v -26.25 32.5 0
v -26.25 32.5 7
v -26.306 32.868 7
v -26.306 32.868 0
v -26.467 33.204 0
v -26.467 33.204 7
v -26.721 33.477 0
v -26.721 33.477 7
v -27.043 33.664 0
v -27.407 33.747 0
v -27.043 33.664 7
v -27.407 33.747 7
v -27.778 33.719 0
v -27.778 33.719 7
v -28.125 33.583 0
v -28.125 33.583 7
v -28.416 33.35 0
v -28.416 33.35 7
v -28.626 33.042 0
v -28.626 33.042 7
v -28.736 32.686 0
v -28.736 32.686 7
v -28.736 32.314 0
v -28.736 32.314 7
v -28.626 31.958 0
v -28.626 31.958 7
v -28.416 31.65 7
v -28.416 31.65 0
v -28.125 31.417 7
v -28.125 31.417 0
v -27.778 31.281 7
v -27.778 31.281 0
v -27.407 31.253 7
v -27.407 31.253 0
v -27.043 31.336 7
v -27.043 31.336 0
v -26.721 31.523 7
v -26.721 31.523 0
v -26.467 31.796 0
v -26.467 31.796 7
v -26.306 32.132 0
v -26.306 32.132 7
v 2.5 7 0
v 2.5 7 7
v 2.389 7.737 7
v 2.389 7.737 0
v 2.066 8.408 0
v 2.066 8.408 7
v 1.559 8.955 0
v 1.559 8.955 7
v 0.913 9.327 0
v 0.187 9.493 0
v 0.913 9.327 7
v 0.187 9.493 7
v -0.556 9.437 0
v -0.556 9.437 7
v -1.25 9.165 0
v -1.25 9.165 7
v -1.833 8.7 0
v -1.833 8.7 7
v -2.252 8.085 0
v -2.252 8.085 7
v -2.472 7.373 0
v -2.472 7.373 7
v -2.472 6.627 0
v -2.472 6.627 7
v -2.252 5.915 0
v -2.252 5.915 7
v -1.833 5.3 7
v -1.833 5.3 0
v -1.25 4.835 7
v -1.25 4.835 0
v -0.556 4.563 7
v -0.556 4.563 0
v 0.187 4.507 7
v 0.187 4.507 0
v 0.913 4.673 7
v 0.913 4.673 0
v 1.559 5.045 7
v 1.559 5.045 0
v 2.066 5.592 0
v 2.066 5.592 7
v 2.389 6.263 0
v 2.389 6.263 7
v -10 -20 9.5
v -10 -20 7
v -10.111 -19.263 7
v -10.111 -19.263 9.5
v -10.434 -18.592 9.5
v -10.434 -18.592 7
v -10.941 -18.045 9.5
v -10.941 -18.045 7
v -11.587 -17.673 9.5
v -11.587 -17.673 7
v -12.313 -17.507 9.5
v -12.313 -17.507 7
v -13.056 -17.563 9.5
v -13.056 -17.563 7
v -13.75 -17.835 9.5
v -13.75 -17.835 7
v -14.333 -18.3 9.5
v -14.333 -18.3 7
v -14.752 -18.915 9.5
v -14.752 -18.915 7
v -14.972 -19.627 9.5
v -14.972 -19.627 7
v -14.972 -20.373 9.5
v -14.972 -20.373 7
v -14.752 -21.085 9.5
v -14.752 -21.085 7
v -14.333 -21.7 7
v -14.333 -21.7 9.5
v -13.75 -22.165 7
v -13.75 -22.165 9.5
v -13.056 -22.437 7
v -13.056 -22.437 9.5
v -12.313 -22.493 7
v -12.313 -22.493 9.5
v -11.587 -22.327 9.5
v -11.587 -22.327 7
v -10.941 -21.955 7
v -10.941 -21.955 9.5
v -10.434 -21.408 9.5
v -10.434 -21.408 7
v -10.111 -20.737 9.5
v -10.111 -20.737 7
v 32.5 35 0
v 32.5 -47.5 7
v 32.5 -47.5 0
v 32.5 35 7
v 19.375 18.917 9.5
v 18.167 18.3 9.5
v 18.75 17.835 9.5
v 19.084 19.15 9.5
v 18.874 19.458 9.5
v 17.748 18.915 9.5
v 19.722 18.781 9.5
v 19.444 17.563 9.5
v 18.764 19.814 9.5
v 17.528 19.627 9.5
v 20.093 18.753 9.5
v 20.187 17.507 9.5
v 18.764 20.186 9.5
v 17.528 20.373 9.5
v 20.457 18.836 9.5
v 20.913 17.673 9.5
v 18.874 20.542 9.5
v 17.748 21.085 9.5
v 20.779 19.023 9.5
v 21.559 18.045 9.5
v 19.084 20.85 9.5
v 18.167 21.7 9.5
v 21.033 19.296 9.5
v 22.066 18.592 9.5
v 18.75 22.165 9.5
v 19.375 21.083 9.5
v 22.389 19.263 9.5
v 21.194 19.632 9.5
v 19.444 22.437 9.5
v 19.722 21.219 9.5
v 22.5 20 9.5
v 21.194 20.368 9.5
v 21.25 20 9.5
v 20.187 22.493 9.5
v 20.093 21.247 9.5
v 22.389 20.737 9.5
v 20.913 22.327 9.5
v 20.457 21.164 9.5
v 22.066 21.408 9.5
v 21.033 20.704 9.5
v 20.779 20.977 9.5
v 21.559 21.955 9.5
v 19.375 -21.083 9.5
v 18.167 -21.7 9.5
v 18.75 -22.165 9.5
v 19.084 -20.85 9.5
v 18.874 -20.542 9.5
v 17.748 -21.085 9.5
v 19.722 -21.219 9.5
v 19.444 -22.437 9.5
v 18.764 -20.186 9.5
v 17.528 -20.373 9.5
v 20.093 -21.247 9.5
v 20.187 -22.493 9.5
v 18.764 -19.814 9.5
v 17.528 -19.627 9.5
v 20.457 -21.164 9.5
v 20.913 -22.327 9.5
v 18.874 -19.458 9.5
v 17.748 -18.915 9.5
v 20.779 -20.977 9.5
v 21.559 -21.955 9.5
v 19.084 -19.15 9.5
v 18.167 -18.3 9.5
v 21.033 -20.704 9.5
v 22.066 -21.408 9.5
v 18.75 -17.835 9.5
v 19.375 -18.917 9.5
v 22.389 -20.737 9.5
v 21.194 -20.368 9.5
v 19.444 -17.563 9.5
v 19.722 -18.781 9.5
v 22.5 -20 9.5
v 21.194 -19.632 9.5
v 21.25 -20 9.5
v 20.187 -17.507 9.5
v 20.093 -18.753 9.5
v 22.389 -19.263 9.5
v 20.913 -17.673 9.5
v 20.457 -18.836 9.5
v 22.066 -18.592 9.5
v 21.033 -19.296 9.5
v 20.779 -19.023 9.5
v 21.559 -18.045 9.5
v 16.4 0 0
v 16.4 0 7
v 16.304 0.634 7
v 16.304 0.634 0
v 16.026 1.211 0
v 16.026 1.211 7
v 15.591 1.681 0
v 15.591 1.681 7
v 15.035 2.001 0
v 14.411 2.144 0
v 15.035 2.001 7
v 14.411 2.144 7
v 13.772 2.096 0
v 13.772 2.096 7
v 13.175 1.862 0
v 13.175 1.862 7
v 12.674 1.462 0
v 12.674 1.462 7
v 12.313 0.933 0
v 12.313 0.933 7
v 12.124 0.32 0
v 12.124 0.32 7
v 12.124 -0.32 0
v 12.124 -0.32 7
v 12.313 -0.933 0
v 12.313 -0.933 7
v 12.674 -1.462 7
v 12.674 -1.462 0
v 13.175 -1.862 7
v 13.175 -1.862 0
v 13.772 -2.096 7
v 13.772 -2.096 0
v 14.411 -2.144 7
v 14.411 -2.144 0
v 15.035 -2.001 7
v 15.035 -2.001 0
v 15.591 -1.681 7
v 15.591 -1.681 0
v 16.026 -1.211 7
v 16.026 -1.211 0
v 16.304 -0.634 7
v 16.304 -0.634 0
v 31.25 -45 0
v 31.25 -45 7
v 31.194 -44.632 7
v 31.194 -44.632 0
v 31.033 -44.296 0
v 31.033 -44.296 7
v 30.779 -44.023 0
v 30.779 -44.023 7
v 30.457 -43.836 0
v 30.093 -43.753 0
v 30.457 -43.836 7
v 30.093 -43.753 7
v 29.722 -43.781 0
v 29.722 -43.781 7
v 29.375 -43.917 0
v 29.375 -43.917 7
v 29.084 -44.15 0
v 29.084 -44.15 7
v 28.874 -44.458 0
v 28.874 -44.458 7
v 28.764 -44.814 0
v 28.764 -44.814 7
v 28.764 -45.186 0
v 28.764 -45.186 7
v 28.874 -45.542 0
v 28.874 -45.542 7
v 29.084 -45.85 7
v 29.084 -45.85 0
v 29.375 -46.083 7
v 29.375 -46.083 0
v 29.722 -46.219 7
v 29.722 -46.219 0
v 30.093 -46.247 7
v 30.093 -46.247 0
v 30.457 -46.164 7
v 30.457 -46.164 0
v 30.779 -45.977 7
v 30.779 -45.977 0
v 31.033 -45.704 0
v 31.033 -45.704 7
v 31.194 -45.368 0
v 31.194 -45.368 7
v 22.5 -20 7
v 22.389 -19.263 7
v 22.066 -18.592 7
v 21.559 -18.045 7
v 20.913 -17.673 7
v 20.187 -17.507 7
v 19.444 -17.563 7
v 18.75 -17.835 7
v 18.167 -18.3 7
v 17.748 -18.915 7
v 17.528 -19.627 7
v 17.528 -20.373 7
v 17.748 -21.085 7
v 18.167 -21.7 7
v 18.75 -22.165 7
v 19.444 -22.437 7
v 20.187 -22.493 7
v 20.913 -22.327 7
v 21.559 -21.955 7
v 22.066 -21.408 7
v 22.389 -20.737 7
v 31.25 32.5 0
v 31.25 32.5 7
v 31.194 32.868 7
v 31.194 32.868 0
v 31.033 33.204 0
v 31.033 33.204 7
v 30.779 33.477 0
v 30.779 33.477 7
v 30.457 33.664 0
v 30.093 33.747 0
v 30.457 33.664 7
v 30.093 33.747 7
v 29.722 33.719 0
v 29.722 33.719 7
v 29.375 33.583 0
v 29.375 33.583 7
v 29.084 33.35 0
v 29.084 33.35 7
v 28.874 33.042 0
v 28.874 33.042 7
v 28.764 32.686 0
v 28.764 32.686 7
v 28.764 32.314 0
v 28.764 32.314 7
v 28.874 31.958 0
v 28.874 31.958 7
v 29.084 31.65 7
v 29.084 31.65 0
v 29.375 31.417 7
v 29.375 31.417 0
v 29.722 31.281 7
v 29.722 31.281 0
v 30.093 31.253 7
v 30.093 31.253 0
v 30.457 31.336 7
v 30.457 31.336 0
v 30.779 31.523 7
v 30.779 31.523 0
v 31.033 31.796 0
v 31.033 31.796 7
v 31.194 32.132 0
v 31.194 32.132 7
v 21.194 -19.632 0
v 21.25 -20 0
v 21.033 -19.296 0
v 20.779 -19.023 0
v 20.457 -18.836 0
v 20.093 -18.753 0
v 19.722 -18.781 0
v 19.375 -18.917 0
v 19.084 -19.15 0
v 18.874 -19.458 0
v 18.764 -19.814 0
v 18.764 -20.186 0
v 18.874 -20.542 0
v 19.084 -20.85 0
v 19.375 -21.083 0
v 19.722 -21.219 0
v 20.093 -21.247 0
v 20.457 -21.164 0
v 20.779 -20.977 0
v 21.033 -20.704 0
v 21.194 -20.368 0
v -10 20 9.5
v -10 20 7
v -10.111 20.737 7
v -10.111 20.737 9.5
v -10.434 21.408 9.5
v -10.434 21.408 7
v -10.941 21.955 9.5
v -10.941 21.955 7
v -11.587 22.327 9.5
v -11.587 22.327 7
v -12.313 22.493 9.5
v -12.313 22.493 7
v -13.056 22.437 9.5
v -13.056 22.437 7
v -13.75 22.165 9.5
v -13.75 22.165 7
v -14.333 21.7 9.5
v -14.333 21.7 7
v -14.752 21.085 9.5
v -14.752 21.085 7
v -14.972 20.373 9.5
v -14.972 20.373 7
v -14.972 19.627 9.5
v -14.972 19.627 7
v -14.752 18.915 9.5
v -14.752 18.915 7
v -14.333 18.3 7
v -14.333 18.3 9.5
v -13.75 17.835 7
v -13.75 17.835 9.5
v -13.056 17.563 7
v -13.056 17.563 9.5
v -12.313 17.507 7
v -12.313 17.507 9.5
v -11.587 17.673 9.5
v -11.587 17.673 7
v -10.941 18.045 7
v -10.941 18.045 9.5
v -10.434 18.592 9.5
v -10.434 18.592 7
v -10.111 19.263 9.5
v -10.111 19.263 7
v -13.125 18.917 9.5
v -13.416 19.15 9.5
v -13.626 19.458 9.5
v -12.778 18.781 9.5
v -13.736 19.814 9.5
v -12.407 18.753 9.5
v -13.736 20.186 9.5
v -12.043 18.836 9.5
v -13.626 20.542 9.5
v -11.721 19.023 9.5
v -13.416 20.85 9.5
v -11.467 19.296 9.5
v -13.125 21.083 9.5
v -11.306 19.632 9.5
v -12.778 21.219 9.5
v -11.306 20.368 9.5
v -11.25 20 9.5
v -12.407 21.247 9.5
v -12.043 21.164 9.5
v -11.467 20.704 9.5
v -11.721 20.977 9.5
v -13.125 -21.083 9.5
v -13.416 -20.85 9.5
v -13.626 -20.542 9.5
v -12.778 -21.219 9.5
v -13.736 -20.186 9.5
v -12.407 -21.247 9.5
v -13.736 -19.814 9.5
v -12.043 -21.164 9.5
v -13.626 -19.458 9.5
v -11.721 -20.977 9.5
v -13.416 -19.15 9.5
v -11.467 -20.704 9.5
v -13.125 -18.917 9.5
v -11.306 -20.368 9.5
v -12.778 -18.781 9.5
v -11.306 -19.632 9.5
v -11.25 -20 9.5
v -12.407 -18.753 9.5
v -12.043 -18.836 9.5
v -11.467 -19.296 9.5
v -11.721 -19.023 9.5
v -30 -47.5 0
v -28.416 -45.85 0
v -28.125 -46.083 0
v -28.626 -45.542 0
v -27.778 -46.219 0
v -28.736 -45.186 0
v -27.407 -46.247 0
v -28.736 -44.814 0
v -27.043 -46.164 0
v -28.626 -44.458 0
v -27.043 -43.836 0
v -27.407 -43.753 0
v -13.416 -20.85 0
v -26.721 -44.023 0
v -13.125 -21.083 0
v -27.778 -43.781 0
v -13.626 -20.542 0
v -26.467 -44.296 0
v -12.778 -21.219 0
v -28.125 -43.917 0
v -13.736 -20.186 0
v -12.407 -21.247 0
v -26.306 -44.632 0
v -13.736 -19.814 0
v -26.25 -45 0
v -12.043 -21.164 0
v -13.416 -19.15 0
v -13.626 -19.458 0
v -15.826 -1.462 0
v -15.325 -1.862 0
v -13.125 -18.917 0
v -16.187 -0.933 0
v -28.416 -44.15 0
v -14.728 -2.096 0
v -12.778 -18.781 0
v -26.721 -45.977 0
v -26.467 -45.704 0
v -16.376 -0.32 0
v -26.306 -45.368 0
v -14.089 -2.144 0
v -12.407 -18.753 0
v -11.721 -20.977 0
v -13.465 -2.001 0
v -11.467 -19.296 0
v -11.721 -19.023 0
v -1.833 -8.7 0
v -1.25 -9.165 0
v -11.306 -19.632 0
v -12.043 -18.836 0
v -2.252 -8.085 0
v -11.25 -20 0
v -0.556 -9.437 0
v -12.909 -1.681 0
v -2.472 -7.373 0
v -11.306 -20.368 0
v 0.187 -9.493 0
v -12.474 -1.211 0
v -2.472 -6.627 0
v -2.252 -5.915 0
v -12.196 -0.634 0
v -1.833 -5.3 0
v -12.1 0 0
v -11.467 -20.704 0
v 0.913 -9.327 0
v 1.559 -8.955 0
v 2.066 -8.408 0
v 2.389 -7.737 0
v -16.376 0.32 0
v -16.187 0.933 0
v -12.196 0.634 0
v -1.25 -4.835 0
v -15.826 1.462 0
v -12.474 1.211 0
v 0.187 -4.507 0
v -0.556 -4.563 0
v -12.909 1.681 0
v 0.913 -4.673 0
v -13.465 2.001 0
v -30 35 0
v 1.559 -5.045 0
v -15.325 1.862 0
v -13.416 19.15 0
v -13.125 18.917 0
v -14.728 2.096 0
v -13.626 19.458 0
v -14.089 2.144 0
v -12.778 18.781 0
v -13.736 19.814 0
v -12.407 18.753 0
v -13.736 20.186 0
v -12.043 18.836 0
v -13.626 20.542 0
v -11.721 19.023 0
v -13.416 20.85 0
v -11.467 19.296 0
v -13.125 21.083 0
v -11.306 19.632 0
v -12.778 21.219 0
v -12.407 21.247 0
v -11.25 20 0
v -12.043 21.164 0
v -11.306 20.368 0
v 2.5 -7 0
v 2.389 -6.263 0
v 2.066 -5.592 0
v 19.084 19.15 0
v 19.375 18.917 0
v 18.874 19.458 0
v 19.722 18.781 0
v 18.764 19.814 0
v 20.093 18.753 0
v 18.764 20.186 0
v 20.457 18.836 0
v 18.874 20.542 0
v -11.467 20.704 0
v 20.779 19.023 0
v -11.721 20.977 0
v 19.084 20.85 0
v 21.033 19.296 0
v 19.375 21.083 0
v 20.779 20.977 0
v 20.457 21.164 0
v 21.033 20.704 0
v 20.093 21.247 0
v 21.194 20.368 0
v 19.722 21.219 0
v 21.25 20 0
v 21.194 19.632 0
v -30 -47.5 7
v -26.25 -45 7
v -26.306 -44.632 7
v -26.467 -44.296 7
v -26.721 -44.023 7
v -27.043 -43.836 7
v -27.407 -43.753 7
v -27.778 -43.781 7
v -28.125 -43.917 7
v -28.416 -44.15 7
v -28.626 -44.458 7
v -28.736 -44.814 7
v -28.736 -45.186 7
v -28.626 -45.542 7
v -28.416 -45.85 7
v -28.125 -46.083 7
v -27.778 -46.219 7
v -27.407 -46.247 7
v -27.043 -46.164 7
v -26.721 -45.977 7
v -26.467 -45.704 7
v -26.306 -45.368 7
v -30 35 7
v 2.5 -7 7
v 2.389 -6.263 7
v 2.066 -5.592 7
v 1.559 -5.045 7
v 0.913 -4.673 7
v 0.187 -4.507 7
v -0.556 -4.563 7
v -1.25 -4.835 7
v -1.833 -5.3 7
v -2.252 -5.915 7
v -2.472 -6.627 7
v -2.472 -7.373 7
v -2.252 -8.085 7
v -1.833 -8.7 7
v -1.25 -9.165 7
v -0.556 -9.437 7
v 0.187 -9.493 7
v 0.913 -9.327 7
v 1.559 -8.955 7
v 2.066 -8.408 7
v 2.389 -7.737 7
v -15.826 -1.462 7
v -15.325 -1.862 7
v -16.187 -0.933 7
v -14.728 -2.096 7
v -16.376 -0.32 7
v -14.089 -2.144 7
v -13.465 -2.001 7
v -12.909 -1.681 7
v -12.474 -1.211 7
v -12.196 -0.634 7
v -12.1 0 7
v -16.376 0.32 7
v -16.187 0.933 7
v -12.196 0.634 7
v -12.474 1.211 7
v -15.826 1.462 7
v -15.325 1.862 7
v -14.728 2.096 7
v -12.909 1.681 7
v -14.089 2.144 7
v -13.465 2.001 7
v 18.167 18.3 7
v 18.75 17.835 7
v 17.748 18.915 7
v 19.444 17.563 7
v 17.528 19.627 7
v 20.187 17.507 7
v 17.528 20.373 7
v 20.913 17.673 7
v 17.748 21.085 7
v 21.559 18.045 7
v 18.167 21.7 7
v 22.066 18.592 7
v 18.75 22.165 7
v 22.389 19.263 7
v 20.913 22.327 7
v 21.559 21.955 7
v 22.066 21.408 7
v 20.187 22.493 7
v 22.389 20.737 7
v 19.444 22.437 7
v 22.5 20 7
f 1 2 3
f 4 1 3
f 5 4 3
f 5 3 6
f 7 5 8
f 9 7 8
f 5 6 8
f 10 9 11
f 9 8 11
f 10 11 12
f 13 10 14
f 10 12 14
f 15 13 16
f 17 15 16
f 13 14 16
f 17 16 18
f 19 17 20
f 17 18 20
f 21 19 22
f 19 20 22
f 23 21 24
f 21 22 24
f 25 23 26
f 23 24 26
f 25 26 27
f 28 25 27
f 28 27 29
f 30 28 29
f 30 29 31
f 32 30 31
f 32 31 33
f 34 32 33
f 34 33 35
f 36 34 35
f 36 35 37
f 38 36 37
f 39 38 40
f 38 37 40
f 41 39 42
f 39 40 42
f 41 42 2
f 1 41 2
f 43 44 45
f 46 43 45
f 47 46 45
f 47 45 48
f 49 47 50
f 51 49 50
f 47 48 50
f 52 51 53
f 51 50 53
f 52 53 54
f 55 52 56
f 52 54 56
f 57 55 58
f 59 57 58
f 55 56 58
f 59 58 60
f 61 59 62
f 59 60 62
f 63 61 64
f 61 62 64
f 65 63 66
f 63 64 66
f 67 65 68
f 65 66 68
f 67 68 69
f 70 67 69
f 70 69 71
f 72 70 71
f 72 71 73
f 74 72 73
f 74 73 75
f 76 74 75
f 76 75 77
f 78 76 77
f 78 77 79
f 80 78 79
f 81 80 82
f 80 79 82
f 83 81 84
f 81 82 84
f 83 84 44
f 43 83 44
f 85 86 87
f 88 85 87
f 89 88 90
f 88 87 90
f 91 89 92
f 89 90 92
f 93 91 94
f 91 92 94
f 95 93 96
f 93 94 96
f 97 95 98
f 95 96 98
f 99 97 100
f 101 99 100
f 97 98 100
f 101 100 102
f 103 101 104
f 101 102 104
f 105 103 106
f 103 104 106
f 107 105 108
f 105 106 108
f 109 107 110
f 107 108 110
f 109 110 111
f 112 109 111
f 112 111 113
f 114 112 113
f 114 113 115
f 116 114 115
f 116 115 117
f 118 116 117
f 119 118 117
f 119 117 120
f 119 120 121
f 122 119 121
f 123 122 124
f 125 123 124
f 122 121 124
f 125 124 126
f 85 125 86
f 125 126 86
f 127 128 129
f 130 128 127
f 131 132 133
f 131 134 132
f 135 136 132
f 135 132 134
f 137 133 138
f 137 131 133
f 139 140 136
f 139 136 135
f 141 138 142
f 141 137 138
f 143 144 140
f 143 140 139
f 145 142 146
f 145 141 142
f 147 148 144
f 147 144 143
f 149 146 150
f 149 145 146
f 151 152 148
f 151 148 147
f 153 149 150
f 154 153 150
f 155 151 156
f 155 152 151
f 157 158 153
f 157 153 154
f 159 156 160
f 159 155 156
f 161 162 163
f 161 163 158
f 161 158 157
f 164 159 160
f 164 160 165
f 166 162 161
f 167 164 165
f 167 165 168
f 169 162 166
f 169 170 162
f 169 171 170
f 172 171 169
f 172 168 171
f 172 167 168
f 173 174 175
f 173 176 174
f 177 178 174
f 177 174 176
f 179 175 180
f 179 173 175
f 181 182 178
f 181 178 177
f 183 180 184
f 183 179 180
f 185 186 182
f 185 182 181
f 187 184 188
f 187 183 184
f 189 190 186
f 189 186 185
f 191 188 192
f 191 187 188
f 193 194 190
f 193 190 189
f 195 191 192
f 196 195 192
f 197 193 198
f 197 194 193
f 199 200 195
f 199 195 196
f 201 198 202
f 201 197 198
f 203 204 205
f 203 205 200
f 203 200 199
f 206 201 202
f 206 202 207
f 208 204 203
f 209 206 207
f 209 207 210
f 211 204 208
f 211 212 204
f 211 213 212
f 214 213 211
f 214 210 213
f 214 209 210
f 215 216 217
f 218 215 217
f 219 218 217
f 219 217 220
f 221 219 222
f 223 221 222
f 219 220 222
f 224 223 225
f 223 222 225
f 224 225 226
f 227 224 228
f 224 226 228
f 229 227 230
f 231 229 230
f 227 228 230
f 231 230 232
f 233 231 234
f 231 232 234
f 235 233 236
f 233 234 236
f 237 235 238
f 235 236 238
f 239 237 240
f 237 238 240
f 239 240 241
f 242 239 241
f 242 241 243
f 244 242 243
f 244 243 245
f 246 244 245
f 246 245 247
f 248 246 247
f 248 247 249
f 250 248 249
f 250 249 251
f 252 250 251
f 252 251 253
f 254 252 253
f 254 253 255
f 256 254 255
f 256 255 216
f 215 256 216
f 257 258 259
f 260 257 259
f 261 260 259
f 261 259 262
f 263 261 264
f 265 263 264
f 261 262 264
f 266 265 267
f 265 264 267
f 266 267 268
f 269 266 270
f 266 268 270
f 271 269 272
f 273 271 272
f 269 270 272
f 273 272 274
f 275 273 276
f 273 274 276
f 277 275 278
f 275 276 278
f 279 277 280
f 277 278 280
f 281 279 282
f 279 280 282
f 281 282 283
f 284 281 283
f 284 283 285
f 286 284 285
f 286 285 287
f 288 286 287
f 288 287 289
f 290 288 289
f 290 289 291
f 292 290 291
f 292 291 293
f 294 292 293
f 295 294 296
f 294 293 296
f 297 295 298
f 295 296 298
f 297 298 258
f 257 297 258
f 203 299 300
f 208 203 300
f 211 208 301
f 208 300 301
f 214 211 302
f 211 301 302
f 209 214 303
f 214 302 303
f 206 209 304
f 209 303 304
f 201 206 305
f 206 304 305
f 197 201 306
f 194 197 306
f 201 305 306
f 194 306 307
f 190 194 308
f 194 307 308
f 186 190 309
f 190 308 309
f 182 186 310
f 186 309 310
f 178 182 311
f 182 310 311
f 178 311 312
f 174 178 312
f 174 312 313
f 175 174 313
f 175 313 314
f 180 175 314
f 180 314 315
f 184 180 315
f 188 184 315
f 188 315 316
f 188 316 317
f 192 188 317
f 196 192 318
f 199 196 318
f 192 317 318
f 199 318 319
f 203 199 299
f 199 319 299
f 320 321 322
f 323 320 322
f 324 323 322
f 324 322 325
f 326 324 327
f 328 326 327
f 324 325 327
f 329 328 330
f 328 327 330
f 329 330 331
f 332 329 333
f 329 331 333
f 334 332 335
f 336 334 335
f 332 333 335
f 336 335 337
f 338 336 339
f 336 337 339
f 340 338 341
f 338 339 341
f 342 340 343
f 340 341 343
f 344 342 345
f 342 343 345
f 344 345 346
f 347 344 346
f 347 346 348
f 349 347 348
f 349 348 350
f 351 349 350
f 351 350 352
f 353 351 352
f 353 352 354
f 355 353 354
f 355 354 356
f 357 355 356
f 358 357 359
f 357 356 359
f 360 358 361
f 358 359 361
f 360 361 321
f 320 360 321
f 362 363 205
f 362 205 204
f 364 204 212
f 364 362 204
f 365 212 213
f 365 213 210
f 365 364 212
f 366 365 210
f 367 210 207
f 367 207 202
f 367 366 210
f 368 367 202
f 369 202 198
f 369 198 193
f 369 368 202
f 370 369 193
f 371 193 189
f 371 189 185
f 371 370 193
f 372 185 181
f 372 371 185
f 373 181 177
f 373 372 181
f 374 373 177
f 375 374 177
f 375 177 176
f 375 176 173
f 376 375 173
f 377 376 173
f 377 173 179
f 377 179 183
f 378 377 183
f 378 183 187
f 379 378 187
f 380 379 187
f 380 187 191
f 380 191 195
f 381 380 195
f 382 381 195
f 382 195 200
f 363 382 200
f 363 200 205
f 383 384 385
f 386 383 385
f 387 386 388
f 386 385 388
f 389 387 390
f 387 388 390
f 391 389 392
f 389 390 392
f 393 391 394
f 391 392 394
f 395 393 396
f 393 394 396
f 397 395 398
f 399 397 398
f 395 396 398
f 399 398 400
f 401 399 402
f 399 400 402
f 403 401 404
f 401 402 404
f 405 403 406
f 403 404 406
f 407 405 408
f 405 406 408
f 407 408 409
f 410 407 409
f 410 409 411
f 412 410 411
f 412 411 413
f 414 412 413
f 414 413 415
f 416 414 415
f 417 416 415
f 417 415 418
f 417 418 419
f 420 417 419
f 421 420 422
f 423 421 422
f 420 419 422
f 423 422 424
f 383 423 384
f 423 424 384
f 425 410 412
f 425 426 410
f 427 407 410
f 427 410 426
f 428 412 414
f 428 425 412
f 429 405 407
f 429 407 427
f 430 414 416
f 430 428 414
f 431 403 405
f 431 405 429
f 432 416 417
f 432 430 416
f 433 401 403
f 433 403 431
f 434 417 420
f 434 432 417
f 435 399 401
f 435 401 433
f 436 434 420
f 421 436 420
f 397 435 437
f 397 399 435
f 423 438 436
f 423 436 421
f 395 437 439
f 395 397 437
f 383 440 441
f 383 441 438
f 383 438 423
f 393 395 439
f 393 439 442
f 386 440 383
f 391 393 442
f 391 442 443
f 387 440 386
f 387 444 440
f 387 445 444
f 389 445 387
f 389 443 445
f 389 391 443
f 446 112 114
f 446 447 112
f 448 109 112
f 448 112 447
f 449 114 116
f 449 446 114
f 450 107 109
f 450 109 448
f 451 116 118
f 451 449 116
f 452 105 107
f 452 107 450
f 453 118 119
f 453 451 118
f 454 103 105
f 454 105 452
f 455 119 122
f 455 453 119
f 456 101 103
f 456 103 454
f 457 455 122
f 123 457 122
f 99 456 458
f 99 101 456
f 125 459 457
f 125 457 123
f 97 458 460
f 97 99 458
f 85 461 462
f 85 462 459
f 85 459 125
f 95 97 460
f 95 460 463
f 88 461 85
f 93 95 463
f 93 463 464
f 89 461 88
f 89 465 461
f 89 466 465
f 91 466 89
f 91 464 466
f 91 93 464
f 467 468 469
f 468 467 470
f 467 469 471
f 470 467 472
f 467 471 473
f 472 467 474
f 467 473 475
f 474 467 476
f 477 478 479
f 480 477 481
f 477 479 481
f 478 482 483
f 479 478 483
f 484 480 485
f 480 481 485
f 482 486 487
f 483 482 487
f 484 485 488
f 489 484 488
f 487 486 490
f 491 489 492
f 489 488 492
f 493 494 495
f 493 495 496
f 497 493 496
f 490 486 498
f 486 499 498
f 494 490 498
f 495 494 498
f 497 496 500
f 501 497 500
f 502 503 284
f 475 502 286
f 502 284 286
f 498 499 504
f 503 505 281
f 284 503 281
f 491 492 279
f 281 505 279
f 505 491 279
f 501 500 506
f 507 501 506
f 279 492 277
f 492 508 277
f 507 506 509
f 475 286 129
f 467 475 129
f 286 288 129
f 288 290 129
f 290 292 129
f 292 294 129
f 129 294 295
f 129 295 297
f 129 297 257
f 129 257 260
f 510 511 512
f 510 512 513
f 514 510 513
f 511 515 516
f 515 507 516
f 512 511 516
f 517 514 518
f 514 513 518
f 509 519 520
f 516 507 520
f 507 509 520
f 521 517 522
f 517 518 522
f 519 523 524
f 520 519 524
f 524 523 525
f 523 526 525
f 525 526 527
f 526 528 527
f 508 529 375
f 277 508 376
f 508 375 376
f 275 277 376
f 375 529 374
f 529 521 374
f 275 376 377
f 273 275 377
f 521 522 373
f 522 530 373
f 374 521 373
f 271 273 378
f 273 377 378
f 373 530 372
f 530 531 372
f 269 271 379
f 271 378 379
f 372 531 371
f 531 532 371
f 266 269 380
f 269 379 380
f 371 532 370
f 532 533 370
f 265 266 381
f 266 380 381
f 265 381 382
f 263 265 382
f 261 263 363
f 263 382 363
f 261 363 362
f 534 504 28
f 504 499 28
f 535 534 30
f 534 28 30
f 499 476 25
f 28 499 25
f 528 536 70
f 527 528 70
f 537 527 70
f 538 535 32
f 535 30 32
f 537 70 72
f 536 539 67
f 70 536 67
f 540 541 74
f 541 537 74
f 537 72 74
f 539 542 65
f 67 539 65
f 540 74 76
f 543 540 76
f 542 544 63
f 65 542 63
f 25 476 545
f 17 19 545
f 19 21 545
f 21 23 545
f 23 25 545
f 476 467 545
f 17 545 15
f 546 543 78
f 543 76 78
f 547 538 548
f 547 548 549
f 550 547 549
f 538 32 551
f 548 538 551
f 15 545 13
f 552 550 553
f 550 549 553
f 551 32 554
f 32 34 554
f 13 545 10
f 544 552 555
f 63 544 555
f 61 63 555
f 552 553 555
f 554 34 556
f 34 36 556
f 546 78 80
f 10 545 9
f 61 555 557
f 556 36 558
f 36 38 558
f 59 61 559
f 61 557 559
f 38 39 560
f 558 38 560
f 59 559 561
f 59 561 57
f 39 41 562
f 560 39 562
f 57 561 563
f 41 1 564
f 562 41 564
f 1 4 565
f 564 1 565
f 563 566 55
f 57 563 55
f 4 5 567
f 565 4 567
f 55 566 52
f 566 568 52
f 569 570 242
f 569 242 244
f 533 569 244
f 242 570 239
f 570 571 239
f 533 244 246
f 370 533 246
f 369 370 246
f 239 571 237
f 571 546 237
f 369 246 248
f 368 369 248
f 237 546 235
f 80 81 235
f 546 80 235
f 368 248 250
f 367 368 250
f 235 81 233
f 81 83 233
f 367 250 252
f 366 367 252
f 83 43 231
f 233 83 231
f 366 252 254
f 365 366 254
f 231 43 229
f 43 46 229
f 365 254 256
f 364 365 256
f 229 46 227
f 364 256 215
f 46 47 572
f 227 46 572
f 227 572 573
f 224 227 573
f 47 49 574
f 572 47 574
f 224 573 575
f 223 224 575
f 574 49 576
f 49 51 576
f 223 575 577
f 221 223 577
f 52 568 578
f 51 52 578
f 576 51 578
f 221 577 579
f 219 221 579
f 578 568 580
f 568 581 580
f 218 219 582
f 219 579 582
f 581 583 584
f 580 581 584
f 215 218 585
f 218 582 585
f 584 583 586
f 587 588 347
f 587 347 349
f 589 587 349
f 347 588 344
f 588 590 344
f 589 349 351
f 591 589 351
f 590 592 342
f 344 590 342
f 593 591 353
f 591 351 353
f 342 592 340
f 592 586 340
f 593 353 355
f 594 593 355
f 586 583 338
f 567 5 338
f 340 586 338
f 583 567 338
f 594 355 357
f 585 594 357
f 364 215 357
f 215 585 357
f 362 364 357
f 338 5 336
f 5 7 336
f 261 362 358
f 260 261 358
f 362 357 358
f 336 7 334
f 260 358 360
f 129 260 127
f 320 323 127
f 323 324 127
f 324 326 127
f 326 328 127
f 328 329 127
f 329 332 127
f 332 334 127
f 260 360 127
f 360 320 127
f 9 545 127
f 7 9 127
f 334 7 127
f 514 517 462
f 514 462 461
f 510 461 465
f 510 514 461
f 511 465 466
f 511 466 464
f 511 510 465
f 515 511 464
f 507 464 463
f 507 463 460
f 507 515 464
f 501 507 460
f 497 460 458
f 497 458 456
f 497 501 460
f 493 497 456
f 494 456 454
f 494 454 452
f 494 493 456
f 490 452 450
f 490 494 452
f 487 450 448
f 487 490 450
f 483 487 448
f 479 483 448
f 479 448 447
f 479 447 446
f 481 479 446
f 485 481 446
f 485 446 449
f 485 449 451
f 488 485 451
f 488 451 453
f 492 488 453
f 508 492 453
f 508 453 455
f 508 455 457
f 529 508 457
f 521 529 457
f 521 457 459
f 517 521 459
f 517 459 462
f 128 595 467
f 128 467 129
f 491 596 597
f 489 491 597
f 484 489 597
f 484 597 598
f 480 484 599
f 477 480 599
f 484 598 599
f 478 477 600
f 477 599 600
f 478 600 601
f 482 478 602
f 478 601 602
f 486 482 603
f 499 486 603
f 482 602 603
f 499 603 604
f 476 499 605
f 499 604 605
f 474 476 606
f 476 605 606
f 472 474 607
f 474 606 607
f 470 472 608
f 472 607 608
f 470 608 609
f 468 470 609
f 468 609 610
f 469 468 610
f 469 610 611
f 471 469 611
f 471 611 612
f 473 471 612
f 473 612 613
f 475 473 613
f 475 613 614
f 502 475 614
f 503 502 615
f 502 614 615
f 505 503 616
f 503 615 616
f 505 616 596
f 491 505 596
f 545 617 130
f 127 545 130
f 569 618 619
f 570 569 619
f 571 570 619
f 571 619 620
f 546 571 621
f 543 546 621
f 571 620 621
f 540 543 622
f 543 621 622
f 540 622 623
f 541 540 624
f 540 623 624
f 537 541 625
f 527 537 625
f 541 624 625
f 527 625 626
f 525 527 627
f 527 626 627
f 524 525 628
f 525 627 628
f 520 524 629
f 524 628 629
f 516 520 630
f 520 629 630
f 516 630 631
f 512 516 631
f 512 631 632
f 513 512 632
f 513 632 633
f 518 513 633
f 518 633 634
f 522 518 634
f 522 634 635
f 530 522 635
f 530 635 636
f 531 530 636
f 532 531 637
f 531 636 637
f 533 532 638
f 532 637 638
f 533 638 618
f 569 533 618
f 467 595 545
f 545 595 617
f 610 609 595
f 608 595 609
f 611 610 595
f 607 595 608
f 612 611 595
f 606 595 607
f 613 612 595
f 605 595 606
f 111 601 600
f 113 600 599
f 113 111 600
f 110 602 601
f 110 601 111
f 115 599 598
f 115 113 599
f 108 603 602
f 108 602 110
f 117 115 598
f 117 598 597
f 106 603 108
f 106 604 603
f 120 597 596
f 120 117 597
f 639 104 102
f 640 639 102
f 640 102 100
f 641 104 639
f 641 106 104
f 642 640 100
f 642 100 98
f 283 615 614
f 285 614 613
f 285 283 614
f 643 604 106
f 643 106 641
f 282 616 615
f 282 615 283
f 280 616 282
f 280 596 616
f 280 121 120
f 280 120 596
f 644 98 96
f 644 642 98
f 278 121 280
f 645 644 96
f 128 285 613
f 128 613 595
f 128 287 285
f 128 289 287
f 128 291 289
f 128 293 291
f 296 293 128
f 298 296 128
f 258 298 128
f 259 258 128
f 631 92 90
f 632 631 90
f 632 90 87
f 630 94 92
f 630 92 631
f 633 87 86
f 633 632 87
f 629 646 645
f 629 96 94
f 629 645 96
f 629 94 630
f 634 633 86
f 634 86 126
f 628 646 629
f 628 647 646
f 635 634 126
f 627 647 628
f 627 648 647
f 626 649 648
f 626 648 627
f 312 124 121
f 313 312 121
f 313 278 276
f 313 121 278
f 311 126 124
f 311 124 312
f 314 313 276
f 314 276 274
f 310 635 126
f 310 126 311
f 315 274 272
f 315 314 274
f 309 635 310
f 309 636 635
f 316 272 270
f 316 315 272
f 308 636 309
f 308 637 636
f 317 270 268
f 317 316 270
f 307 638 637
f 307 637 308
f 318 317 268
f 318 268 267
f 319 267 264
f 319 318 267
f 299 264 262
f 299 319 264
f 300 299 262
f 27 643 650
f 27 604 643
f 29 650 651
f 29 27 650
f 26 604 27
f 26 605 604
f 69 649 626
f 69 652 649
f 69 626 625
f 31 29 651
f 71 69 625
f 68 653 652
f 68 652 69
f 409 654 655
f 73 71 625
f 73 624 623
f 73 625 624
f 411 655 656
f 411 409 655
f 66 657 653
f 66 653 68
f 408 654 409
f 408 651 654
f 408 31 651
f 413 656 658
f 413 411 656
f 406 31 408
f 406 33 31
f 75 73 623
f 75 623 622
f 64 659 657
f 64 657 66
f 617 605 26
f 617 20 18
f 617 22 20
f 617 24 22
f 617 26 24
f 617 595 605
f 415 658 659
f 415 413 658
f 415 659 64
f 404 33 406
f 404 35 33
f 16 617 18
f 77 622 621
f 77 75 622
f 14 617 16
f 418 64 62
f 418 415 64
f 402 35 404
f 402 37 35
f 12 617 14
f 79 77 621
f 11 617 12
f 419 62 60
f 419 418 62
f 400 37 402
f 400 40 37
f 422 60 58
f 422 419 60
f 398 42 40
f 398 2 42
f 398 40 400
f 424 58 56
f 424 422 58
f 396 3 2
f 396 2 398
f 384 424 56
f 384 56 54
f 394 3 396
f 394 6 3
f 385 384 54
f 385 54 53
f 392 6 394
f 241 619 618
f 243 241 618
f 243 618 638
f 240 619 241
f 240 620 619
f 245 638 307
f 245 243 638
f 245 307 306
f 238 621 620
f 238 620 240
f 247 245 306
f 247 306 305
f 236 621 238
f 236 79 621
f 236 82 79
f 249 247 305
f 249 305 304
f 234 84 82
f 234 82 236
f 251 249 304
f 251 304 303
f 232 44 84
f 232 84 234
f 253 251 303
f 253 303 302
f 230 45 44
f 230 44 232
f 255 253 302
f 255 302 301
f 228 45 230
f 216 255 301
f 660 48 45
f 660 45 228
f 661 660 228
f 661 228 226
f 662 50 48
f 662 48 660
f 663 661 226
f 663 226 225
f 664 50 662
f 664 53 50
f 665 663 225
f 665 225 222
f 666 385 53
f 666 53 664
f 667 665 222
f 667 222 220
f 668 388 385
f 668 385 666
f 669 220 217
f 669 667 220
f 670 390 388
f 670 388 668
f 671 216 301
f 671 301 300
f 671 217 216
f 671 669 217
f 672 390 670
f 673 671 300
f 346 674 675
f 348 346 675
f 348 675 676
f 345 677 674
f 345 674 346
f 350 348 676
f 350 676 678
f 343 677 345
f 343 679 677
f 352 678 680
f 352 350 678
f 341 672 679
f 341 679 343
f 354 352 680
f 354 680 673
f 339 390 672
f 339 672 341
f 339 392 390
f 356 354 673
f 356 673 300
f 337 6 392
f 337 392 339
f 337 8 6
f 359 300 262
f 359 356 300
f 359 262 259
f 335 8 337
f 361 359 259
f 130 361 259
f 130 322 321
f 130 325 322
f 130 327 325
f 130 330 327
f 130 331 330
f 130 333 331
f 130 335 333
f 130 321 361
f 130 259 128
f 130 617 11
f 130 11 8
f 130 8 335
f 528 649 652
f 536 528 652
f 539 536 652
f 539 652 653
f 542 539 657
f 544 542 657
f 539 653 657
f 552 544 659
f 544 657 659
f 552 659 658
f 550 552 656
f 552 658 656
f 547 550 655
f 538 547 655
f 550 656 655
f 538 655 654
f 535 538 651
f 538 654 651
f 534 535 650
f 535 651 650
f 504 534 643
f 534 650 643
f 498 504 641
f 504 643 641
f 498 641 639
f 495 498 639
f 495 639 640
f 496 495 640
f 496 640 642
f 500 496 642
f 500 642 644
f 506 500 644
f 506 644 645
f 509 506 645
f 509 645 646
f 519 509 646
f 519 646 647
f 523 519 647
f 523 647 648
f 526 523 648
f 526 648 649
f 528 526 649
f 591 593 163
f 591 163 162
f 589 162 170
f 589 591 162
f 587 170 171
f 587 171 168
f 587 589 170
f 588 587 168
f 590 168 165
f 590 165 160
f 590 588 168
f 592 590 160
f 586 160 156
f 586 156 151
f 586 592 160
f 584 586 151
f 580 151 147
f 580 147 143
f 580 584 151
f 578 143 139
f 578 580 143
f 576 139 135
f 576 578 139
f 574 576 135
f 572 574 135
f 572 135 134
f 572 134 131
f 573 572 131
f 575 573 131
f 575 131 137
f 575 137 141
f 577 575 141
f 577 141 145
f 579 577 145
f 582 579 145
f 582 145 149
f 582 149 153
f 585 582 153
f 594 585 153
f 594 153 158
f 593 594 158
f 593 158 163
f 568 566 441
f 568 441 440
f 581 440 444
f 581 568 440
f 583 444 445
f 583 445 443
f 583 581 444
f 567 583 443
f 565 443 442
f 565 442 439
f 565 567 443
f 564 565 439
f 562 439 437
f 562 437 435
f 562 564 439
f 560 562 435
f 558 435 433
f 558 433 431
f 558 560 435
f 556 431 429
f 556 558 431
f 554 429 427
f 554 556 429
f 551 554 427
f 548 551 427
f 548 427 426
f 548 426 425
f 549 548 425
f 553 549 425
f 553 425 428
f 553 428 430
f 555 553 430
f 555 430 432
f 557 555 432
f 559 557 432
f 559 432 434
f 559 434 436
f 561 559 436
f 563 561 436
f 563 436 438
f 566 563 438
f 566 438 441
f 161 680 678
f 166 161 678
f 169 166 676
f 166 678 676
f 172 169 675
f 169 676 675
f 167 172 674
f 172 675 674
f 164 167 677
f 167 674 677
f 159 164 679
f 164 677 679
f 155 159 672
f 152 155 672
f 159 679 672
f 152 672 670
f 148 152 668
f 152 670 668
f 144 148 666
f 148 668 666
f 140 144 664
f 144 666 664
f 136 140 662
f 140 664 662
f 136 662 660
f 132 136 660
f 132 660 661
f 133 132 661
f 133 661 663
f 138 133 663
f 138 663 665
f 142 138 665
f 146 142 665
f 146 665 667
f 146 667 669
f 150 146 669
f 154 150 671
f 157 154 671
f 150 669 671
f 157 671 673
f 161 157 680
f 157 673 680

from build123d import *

# Parameters (mm, degrees)
SKIZZE1_R                         = 2.15
AUFSATZ_LINEAR_AUSTRAGEN1_DEPTH   = 12
AUFSATZ_LINEAR_AUSTRAGEN1_2_DEPTH = 12
AUFSATZ_LINEAR_START              = 7
SKIZZE1_3_W                       = 10
SKIZZE1_3_H                       = 34
SKIZZE1_3_R                       = 2.15
SKIZZE1_3_R_2                     = 2.5
AUFSATZ_LINEAR_AUSTRAGEN3_DEPTH   = 7
SKIZZE4_W                         = 52.5
SKIZZE4_H                         = 72.5
SKIZZE4_R                         = 2.5
SKIZZE4_R_2                       = 2.15
AUFSATZ_LINEAR_AUSTRAGEN4_DEPTH   = 7
SKIZZE4_3_R                       = 2.5
SKIZZE4_3_R_2                     = 1.25
AUFSATZ_LINEAR_AUSTRAGEN5_DEPTH   = 2.5
SCHNITT_LINEAR_START              = -7
SKIZZE4_4_R                       = 1.25
SCHNITT_LINEAR_AUSTRAGEN1_DEPTH   = 7
SKIZZE4_5_R                       = 2.15
SCHNITT_LINEAR_AUSTRAGEN2_DEPTH   = 19
SKIZZE6_W                         = 62.5
SKIZZE6_H                         = 82.5
SKIZZE6_W_2                       = 52.5
SKIZZE6_H_2                       = 72.5
AUFSATZ_LINEAR_AUSTRAGEN6_DEPTH   = 7
SKIZZE5_R                         = 1.25
SCHNITT_LINEAR_AUSTRAGEN3_DEPTH   = 7


with BuildPart() as part:
    # Skizze1 → Aufsatz-Linear austragen1 (new body)
    with BuildSketch(Plane.XY):
        with Locations((-14.25, 0)):
            Circle(SKIZZE1_R)
    extrude(amount=-AUFSATZ_LINEAR_AUSTRAGEN1_DEPTH)



with BuildPart() as body_2:
    # Skizze1 → Aufsatz-Linear austragen1 2 (new body)
    with BuildSketch(Plane.XY):
        with Locations((14.25, 0)):
            Circle(SKIZZE1_R)
    extrude(amount=-AUFSATZ_LINEAR_AUSTRAGEN1_2_DEPTH)


with BuildPart() as part_1:
    add(part.part)

    add(body_2.part)  # Aufsatz-Linear austragen3 merges body 2
    # Skizze1<3> → Aufsatz-Linear austragen3 (add)
    # profile 1 of 4: a face of its own
    with BuildSketch(Plane.XY.offset(AUFSATZ_LINEAR_START)):
        with Locations((-12.5, 0)):
            Rectangle(SKIZZE1_3_W, SKIZZE1_3_H)
        with Locations((-14.25, 0)):
            Circle(SKIZZE1_3_R, mode=Mode.SUBTRACT)
    # profile 2 of 4: a face of its own
    with BuildSketch(Plane.XY.offset(AUFSATZ_LINEAR_START)):
        Polygon((17.5, -17), (17.5, 17), (0, 17), (-7.5, 17), (-7.5, -17), align=None)
        with Locations((0, -7)):
            Circle(SKIZZE1_3_R_2, mode=Mode.SUBTRACT)
        with Locations((0, 7)):
            Circle(SKIZZE1_3_R_2, mode=Mode.SUBTRACT)
        with Locations((14.25, 0)):
            Circle(SKIZZE1_3_R, mode=Mode.SUBTRACT)
    # profile 3 of 4: a face of its own
    with BuildSketch(Plane.XY.offset(AUFSATZ_LINEAR_START)):
        with Locations((-14.25, 0)):
            Circle(SKIZZE1_3_R)
    # profile 4 of 4: a face of its own
    with BuildSketch(Plane.XY.offset(AUFSATZ_LINEAR_START)):
        with Locations((14.25, 0)):
            Circle(SKIZZE1_3_R)
    extrude(amount=-AUFSATZ_LINEAR_AUSTRAGEN3_DEPTH)

    # Skizze4 → Aufsatz-Linear austragen4 (add)
    with BuildSketch(Plane.XY.offset(7)):
        with Locations((1.25, -6.25)):
            Rectangle(SKIZZE4_W, SKIZZE4_H)
        with Locations((0, -7)):
            Circle(SKIZZE4_R, mode=Mode.SUBTRACT)
        with Locations((-14.25, 0)):
            Circle(SKIZZE4_R_2, mode=Mode.SUBTRACT)
        with Locations((0, 7)):
            Circle(SKIZZE4_R, mode=Mode.SUBTRACT)
        with Locations((14.25, 0)):
            Circle(SKIZZE4_R_2, mode=Mode.SUBTRACT)
    extrude(amount=-AUFSATZ_LINEAR_AUSTRAGEN4_DEPTH)

    # Skizze4<3> → Aufsatz-Linear austragen5 (add)
    # profile 1 of 4: a face of its own
    with BuildSketch(Plane.XY.offset(7)):
        with Locations((-12.5, -20)):
            Circle(SKIZZE4_3_R)
        with Locations((-12.5, -20)):
            Circle(SKIZZE4_3_R_2, mode=Mode.SUBTRACT)
    # profile 2 of 4: a face of its own
    with BuildSketch(Plane.XY.offset(7)):
        with Locations((-12.5, 20)):
            Circle(SKIZZE4_3_R)
        with Locations((-12.5, 20)):
            Circle(SKIZZE4_3_R_2, mode=Mode.SUBTRACT)
    # profile 3 of 4: a face of its own
    with BuildSketch(Plane.XY.offset(7)):
        with Locations((20, 20)):
            Circle(SKIZZE4_3_R)
        with Locations((20, 20)):
            Circle(SKIZZE4_3_R_2, mode=Mode.SUBTRACT)
    # profile 4 of 4: a face of its own
    with BuildSketch(Plane.XY.offset(7)):
        with Locations((20, -20)):
            Circle(SKIZZE4_3_R)
        with Locations((20, -20)):
            Circle(SKIZZE4_3_R_2, mode=Mode.SUBTRACT)
    extrude(amount=AUFSATZ_LINEAR_AUSTRAGEN5_DEPTH)

    # Skizze4<4> → Schnitt-Linear austragen1 (cut)
    with BuildSketch(Plane.XY.offset(7).offset(SCHNITT_LINEAR_START)):
        with Locations((-12.5, -20)):
            Circle(SKIZZE4_4_R)
        with Locations((20, 20)):
            Circle(SKIZZE4_4_R)
        with Locations((20, -20)):
            Circle(SKIZZE4_4_R)
        with Locations((-12.5, 20)):
            Circle(SKIZZE4_4_R)
    extrude(amount=SCHNITT_LINEAR_AUSTRAGEN1_DEPTH, mode=Mode.SUBTRACT)

    # Skizze4<5> → Schnitt-Linear austragen2 (cut)
    with BuildSketch(Plane.XY.offset(7)):
        with Locations((-14.25, 0)):
            Circle(SKIZZE4_5_R)
        with Locations((14.25, 0)):
            Circle(SKIZZE4_5_R)
    extrude(amount=-SCHNITT_LINEAR_AUSTRAGEN2_DEPTH, mode=Mode.SUBTRACT)

    # Skizze6 → Aufsatz-Linear austragen6 (add)
    with BuildSketch(Plane.XY.offset(7)):
        with Locations((1.25, -6.25)):
            Rectangle(SKIZZE6_W, SKIZZE6_H)
        with Locations((1.25, -6.25)):
            Rectangle(SKIZZE6_W_2, SKIZZE6_H_2, mode=Mode.SUBTRACT)
    extrude(amount=-AUFSATZ_LINEAR_AUSTRAGEN6_DEPTH)

    # Skizze5 → Schnitt-Linear austragen3 (cut)
    with BuildSketch(Plane.XY.offset(7)):
        with Locations((-27.5, 32.5)):
            Circle(SKIZZE5_R)
        with Locations((-27.5, -45)):
            Circle(SKIZZE5_R)
        with Locations((30, -45)):
            Circle(SKIZZE5_R)
        with Locations((30, 32.5)):
            Circle(SKIZZE5_R)
    extrude(amount=-SCHNITT_LINEAR_AUSTRAGEN3_DEPTH, mode=Mode.SUBTRACT)


solid = part_1.part
